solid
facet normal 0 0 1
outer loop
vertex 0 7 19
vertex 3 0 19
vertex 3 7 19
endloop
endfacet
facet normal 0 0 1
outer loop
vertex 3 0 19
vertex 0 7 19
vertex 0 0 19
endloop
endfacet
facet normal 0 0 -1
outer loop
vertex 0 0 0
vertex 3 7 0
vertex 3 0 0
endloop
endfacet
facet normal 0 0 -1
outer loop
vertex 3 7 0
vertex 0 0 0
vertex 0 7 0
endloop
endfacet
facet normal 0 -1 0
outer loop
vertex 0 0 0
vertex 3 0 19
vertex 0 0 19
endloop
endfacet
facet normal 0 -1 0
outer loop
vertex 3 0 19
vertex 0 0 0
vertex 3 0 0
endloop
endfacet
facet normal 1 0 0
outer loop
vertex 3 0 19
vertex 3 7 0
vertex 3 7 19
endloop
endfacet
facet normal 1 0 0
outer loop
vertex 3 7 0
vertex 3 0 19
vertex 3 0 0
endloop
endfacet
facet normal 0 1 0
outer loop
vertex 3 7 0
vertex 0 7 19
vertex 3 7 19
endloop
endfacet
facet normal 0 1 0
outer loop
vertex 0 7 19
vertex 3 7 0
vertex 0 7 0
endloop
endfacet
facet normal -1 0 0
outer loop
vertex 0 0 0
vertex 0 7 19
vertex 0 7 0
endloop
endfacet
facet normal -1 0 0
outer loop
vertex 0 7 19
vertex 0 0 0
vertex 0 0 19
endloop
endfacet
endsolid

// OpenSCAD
// Generated by SolidPython 1.0.1 on 2020-07-29 00:39:26


cube(size = [3, 7, 19]);
/***********************************************
*********      SolidPython code:      **********
************************************************
 
# import packages: SolidPython
from solid import *
from solid.utils import *
from itertools import chain, combinations


class Resize:

    def __init__(self, scad_file):
        self.scad_file = scad_file
        #self.scad_file = import_scad(scad_file)
        # cone/cylinder param:
        self.r1 = 0
        self.r2 = 0
        self.h = 0
        # rectangular prism param:
        self.w = 0
        self.l = 0
        # ellipse param:
        self.r = 0

    # import OpenScad code (file name corresponds to shape)


    # classify shape + parameters
    def assign(self, param1, param2, param3):
        if self.scad_file == 'cone.scad':
            self.r1 = param1
            self.r2 = param2
            self.h = param3
        elif self.scad_file == 'cylinder.scad':
            self.r1 = param1
            self.r2 = param2
            self.h = param3
        elif self.scad_file == 'rectangularPrism.scad':
            self.h = param1
            self.l = param2
            self.w = param3
        else:
            self.r = param1
            self.h = param2

    # resize parameters
    def iterate(self):
        x = range(3, 20, 2)
        i = 1
        if self.scad_file == 'cone.scad':
            tempList = list(combinations(x, 2))
            for temp in tempList:
                param1 = temp[0]
                param2 = temp[1]
                filepath = 'produced_scad_files/' + 'cone' + str(param1) + '_' + str(param2) + '_' + '.scad'
                scad_render_to_file(cylinder(h=param1, r1=param2, r2=0), filepath)

        elif self.scad_file == 'cylinder.scad':
            tempList = list(combinations(x, 3))
            for temp in tempList:
                param1 = temp[0]
                param2 = temp[1]
                filepath = 'produced_scad_files/' + 'cylinder' + str(param1) + '_' + str(param2) + '_' + '.scad'
                scad_render_to_file(cylinder(h=param1, r1=param2, r2=param2), filepath)

        elif self.scad_file == 'rectangularPrism.scad':
            tempList = list(combinations(x, 3))
            for temp in tempList:
                param1 = temp[0]
                param2 = temp[1]
                param3 = temp[2]
                filepath = 'produced_scad_files/' + 'rectangularPrism' + str(param1) + '_' + str(param2) + '_' + str(
                    param3) + '.scad'
                scad_render_to_file(cube(size=(param1, param2, param3)), filepath)

        elif self.scad_file == 'ellipse.scad':
            tempList = list(combinations(x, 4))
            for temp in tempList:
                param1 = temp[0]
                param2 = temp[1]
                param3 = temp[2]
                param4 = temp[3]
                filepath = 'produced_scad_files/' + 'ellipse' + str(param1) + '_' + str(param2) + '_' + str(param3) + '_' + str(param4) + '.scad'
                scad_render_to_file(scale([param1, param2, param3])(sphere(r=param4)), filepath)

    def render_to_scadfile(self):
        scad_render_to_file(scad, 'example.scad') 
 
************************************************/
